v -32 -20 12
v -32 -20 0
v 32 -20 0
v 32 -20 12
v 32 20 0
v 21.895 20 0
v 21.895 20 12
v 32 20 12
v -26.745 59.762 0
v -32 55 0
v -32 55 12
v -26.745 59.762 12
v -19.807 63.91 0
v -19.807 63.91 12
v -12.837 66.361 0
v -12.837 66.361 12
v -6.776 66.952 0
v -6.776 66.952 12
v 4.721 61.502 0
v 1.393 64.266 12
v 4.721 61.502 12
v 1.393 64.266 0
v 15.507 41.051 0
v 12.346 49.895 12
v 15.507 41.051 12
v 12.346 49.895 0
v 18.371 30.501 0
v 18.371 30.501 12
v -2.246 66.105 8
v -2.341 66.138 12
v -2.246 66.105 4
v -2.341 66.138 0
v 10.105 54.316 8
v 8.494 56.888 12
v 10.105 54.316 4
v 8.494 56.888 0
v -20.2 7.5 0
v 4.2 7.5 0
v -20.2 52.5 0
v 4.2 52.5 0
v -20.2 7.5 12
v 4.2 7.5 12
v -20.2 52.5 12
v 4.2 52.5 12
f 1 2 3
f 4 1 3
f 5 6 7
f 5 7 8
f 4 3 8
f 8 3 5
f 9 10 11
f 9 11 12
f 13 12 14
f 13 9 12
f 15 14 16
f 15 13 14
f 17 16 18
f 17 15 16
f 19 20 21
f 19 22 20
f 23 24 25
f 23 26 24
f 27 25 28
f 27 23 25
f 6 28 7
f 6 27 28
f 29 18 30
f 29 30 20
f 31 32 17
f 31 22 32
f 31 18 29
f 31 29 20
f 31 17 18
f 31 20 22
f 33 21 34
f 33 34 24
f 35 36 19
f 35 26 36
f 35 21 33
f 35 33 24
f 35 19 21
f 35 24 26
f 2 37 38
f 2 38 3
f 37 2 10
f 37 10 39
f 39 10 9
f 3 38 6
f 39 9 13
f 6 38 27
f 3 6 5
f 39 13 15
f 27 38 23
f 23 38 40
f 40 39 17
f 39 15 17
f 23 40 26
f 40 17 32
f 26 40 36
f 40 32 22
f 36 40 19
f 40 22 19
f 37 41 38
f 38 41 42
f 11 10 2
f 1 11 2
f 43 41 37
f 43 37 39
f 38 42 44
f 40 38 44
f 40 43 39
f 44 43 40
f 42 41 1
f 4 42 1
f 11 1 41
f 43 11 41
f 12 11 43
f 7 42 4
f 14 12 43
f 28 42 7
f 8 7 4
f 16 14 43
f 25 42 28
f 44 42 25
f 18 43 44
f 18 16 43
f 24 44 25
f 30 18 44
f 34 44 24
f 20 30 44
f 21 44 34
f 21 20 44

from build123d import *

# Parameters (mm, degrees)
SKETCH1_W           = 64
SKETCH1_H           = 40
BOSS_EXTRUDE1_DEPTH = 12
SKETCH2_W           = 24.4
SKETCH2_H           = 45
CUT_EXTRUDE1_DEPTH  = 20


with BuildPart() as part:
    # Sketch1 → Boss-Extrude1 (new body)
    with BuildSketch(Plane.XY):
        with BuildLine():
            Line((-32, 55), (-32, 20))
            Line((-32, 20), (21.894736842, 20))
            add(Edge.make_bspline(
                [(-32, 55), (-26.093097091, 61.828307886), (-5.103314892, 73.642536114), (16.062213436, 49.100660173), (17.060908408, 31.40349279), (21.894736842, 20)],
                knots=[0, 0, 0, 0, 0.381160141, 0.579099432, 1, 1, 1, 1], degree=3))
        make_face()
        Rectangle(SKETCH1_W, SKETCH1_H)
    extrude(amount=BOSS_EXTRUDE1_DEPTH)

    # Sketch2 → Cut-Extrude1 (cut)
    with BuildSketch(Plane.XY.offset(12)):
        with Locations((-8, 30)):
            Rectangle(SKETCH2_W, SKETCH2_H)
    extrude(amount=-CUT_EXTRUDE1_DEPTH, mode=Mode.SUBTRACT)


solid = part.part
